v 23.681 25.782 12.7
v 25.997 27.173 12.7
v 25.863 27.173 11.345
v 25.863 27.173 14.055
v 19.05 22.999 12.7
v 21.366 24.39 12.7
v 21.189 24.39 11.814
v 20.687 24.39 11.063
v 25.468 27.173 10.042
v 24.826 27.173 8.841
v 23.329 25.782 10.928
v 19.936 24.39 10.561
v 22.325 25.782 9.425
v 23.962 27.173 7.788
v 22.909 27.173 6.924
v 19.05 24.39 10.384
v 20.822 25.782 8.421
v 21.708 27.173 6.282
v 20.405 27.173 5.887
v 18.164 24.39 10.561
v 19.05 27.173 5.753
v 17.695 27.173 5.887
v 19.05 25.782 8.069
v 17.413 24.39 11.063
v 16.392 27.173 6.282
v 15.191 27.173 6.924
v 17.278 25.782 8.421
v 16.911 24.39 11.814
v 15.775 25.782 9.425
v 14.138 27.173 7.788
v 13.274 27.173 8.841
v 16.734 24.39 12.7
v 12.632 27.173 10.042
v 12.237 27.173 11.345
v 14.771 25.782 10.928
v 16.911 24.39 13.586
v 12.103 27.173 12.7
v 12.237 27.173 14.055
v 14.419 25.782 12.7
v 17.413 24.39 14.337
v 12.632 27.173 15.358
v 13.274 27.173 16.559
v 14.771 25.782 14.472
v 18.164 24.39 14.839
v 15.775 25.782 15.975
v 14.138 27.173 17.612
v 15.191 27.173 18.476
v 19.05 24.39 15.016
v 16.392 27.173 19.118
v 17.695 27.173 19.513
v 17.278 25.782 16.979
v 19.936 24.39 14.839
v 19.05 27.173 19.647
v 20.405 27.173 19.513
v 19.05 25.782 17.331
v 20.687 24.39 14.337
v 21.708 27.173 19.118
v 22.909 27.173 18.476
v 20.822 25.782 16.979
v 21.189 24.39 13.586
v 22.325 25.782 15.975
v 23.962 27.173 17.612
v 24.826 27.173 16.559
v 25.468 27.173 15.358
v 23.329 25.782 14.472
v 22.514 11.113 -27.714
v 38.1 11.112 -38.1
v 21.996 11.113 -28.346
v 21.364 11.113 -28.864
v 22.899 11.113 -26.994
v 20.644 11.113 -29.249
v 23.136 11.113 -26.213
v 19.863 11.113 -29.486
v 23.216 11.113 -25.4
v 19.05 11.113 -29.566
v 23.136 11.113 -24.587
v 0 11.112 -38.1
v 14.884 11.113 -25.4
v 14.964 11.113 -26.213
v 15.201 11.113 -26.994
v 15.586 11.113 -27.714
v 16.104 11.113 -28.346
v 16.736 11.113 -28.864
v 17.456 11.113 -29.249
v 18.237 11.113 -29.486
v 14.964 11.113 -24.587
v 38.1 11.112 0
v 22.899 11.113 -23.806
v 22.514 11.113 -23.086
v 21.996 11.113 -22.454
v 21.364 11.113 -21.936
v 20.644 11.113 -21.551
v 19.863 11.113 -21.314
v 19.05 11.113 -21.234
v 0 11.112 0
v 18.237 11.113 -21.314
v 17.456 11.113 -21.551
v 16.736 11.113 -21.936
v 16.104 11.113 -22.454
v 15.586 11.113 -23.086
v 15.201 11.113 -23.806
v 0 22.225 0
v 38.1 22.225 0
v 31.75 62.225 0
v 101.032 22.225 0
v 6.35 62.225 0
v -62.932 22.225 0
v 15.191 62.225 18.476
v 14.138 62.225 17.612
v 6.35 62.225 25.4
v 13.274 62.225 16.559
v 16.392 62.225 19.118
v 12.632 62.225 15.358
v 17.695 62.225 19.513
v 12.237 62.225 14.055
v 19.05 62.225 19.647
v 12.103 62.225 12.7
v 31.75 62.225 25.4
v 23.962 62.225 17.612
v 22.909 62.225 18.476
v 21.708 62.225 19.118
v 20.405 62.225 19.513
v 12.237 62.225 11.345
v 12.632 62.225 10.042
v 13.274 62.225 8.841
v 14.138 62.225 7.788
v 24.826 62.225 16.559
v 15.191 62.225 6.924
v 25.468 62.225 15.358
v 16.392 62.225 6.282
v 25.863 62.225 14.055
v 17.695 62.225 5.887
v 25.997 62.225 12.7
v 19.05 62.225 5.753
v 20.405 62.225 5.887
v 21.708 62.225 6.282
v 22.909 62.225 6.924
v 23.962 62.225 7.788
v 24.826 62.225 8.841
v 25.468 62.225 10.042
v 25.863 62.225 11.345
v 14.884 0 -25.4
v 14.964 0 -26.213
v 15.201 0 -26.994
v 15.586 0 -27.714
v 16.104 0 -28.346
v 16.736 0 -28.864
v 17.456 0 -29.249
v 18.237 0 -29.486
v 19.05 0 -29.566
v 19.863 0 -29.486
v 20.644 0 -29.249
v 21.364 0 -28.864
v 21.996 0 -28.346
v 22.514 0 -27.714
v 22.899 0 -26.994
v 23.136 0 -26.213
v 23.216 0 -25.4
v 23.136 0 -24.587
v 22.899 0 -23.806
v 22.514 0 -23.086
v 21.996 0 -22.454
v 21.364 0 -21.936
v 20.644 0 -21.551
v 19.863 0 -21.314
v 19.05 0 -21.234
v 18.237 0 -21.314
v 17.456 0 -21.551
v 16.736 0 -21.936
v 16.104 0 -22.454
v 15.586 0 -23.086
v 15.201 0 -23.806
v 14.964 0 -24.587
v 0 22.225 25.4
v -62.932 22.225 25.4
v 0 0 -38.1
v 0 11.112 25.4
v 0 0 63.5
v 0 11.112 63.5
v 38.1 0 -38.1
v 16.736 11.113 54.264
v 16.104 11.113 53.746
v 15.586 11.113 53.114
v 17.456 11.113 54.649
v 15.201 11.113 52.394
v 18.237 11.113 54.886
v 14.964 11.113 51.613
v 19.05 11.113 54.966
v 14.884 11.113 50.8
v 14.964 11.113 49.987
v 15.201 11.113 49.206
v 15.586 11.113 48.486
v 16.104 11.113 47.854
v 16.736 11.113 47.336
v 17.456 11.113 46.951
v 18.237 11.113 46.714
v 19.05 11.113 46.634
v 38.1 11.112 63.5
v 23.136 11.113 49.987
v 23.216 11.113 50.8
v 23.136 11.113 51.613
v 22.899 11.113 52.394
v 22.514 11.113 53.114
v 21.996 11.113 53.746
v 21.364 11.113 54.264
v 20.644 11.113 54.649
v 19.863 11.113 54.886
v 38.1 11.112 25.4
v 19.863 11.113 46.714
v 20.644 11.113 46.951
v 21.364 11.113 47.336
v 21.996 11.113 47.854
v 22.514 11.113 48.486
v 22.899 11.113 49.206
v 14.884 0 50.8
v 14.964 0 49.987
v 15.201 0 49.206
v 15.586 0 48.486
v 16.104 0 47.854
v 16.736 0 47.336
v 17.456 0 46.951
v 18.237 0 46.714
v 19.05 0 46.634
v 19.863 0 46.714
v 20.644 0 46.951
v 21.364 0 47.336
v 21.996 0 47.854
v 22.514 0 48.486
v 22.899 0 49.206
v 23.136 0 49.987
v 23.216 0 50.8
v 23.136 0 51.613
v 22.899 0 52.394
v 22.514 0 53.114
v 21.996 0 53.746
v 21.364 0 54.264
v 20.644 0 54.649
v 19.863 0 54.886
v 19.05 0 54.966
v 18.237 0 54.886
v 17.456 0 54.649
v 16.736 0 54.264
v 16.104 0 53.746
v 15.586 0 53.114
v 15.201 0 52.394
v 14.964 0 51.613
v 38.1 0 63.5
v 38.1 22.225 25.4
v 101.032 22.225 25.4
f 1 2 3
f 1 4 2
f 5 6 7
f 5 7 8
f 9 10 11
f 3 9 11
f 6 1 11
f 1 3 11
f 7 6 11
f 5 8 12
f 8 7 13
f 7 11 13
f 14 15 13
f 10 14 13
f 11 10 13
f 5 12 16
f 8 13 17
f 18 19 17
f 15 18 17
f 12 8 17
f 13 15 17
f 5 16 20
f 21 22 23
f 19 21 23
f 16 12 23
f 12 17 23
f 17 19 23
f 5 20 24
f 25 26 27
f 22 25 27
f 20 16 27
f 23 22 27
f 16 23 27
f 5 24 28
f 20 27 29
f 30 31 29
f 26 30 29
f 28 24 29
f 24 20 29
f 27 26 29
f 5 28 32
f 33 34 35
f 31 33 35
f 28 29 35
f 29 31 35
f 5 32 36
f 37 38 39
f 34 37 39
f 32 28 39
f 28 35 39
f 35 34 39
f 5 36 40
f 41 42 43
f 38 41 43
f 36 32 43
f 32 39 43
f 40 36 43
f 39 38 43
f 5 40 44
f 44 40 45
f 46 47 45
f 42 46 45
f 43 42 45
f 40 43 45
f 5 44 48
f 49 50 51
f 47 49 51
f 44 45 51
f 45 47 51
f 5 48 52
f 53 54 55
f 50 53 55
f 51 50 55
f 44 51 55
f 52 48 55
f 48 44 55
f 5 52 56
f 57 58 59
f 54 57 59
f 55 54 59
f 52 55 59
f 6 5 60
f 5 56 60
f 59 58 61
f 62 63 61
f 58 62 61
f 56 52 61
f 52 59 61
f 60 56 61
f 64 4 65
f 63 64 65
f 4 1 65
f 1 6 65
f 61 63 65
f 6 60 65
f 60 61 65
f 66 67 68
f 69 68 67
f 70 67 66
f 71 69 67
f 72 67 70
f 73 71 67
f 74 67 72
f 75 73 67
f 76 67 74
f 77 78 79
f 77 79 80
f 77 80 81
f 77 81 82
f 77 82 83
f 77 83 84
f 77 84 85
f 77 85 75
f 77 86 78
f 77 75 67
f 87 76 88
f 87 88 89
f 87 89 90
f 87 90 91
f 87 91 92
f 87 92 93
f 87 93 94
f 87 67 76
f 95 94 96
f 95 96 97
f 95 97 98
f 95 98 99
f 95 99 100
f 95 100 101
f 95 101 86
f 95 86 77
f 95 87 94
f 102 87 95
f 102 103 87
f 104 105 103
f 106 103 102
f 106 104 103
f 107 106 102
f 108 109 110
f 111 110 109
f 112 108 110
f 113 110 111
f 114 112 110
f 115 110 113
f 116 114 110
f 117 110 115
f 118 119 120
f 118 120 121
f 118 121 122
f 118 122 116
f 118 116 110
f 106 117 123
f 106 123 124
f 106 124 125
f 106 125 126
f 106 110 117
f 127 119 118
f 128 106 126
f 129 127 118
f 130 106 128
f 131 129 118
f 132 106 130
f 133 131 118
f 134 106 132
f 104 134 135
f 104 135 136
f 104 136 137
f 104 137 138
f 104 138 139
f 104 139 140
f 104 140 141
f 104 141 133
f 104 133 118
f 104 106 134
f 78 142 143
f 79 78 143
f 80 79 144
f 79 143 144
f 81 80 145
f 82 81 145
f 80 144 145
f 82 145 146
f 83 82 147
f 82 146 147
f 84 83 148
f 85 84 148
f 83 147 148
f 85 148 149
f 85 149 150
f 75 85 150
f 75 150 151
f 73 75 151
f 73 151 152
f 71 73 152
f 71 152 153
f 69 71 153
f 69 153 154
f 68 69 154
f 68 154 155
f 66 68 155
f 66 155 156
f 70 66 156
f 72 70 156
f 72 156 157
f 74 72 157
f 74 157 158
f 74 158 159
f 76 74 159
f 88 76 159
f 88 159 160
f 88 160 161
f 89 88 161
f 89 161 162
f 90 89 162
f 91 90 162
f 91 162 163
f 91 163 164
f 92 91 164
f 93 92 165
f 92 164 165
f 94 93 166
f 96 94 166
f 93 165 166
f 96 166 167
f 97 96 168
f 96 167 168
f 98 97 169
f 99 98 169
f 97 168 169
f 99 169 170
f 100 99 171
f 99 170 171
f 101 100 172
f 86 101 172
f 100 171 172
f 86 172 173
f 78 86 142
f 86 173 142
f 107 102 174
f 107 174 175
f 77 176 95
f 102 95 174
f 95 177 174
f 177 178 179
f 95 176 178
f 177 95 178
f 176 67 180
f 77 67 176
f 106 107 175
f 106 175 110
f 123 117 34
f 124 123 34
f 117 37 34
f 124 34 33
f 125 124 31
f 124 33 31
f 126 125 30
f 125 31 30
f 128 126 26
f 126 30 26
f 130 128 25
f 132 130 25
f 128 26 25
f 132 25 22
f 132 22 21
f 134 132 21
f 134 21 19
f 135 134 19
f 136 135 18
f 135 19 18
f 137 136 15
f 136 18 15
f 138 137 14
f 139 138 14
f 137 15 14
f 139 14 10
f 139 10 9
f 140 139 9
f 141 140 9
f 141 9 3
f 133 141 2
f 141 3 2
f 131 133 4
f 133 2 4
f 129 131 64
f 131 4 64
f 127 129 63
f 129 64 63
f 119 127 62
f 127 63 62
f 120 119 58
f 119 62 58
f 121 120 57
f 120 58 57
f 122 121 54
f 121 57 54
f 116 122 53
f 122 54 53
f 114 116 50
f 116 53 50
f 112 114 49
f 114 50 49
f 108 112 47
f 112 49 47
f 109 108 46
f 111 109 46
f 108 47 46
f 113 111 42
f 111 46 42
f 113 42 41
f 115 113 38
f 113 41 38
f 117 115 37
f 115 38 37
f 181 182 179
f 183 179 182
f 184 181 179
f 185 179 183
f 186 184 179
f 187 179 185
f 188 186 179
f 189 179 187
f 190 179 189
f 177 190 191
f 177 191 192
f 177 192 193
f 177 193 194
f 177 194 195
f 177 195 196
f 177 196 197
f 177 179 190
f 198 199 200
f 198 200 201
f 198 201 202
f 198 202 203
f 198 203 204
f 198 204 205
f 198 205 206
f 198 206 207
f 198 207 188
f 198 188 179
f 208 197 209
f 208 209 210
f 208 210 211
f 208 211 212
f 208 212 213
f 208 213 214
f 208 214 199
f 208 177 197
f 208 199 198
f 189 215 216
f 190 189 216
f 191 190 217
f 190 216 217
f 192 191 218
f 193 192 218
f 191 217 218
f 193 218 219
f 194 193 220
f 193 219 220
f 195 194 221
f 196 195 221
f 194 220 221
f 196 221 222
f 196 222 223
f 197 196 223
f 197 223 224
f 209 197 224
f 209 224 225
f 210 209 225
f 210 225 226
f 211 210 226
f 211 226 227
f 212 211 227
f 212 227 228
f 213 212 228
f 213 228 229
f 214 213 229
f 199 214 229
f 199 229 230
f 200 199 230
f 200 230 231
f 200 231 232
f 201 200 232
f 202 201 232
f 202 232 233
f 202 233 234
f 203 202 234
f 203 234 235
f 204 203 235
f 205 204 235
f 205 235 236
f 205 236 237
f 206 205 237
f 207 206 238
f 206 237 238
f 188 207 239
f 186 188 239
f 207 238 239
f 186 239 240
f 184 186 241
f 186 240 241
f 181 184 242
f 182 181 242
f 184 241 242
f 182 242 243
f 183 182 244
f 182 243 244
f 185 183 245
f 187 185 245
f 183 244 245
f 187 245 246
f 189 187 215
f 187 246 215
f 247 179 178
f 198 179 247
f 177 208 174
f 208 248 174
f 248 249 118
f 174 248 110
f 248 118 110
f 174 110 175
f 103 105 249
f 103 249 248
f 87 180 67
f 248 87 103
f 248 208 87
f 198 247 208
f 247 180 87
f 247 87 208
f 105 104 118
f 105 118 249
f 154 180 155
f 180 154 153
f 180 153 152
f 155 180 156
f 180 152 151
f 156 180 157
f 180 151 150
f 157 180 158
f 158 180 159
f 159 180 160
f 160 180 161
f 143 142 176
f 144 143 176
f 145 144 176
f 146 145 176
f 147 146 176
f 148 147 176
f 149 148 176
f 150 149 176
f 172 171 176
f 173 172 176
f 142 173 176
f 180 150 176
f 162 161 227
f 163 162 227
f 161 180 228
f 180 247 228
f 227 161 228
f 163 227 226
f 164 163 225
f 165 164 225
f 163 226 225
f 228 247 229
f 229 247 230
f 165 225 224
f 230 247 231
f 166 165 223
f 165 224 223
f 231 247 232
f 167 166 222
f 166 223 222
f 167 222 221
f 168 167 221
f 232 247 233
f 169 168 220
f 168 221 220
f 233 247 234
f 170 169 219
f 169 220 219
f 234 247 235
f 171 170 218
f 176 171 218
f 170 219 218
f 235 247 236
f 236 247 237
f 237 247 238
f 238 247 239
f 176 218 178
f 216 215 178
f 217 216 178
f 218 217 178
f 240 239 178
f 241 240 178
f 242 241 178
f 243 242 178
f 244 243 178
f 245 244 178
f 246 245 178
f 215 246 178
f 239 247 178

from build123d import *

# Parameters (mm, degrees)
BOSS_EXTRUDE1_DEPTH        = 25.4
SKETCH2_W                  = 38.1
SKETCH2_H                  = 11.1125
BOSS_EXTRUDE2_DEPTH        = 38.1
SKETCH3_W                  = 38.1
SKETCH3_H                  = 11.1125
BOSS_EXTRUDE3_DEPTH        = 38.1
F_0_328IN_DOWEL_HOLE1_D    = 8.3312
F_0_55IN_DOWEL_HOLE2_D     = 13.8938
F_0_55IN_DOWEL_HOLE2_DEPTH = 35.052
F_0_55IN_DOWEL_HOLE2_TIP   = 4.174118634


with BuildPart() as part:
    # Sketch1 → Boss-Extrude1 (new body)
    with BuildSketch(Plane.XY):
        Polygon((0, 0), (0, 22.225), (-62.932032303, 22.225), (6.35, 62.225), (31.75, 62.225), (101.032032303, 22.225), (38.1, 22.225), (38.1, 0), align=None)
    extrude(amount=BOSS_EXTRUDE1_DEPTH)

    # Sketch2 → Boss-Extrude2 (add)
    with BuildSketch(Plane.XY.offset(25.4)):
        with Locations((19.05, 5.55625)):
            Rectangle(SKETCH2_W, SKETCH2_H)
    extrude(amount=BOSS_EXTRUDE2_DEPTH)

    # Sketch3 → Boss-Extrude3 (add)
    with BuildSketch(Plane(origin=(0, 0, 0), x_dir=(-1, 0, 0), z_dir=(0, 0, -1))):
        with Locations((-19.05, 5.55625)):
            Rectangle(SKETCH3_W, SKETCH3_H)
    extrude(amount=BOSS_EXTRUDE3_DEPTH)

    # Ø0.328in Dowel Hole1 (through all)
    with Locations(Plane(origin=(0, 11.1125, 0), x_dir=(1, 0, 0), z_dir=(0, 1, 0))):
        with Locations((19.05, 25.4), (19.05, -50.8)):
            Hole(F_0_328IN_DOWEL_HOLE1_D / 2)

    # Ø0.55in Dowel Hole2
    with Locations(Plane(origin=(0, 62.225, 0), x_dir=(1, 0, 0), z_dir=(0, 1, 0))):
        with Locations((19.05, -12.7)):
            Hole(F_0_55IN_DOWEL_HOLE2_D / 2, depth=F_0_55IN_DOWEL_HOLE2_DEPTH)
            with Locations((0, 0, -(F_0_55IN_DOWEL_HOLE2_DEPTH + F_0_55IN_DOWEL_HOLE2_TIP / 2))):  # 118° drill point
                Cone(0, F_0_55IN_DOWEL_HOLE2_D / 2, F_0_55IN_DOWEL_HOLE2_TIP, mode=Mode.SUBTRACT)


solid = part.part
